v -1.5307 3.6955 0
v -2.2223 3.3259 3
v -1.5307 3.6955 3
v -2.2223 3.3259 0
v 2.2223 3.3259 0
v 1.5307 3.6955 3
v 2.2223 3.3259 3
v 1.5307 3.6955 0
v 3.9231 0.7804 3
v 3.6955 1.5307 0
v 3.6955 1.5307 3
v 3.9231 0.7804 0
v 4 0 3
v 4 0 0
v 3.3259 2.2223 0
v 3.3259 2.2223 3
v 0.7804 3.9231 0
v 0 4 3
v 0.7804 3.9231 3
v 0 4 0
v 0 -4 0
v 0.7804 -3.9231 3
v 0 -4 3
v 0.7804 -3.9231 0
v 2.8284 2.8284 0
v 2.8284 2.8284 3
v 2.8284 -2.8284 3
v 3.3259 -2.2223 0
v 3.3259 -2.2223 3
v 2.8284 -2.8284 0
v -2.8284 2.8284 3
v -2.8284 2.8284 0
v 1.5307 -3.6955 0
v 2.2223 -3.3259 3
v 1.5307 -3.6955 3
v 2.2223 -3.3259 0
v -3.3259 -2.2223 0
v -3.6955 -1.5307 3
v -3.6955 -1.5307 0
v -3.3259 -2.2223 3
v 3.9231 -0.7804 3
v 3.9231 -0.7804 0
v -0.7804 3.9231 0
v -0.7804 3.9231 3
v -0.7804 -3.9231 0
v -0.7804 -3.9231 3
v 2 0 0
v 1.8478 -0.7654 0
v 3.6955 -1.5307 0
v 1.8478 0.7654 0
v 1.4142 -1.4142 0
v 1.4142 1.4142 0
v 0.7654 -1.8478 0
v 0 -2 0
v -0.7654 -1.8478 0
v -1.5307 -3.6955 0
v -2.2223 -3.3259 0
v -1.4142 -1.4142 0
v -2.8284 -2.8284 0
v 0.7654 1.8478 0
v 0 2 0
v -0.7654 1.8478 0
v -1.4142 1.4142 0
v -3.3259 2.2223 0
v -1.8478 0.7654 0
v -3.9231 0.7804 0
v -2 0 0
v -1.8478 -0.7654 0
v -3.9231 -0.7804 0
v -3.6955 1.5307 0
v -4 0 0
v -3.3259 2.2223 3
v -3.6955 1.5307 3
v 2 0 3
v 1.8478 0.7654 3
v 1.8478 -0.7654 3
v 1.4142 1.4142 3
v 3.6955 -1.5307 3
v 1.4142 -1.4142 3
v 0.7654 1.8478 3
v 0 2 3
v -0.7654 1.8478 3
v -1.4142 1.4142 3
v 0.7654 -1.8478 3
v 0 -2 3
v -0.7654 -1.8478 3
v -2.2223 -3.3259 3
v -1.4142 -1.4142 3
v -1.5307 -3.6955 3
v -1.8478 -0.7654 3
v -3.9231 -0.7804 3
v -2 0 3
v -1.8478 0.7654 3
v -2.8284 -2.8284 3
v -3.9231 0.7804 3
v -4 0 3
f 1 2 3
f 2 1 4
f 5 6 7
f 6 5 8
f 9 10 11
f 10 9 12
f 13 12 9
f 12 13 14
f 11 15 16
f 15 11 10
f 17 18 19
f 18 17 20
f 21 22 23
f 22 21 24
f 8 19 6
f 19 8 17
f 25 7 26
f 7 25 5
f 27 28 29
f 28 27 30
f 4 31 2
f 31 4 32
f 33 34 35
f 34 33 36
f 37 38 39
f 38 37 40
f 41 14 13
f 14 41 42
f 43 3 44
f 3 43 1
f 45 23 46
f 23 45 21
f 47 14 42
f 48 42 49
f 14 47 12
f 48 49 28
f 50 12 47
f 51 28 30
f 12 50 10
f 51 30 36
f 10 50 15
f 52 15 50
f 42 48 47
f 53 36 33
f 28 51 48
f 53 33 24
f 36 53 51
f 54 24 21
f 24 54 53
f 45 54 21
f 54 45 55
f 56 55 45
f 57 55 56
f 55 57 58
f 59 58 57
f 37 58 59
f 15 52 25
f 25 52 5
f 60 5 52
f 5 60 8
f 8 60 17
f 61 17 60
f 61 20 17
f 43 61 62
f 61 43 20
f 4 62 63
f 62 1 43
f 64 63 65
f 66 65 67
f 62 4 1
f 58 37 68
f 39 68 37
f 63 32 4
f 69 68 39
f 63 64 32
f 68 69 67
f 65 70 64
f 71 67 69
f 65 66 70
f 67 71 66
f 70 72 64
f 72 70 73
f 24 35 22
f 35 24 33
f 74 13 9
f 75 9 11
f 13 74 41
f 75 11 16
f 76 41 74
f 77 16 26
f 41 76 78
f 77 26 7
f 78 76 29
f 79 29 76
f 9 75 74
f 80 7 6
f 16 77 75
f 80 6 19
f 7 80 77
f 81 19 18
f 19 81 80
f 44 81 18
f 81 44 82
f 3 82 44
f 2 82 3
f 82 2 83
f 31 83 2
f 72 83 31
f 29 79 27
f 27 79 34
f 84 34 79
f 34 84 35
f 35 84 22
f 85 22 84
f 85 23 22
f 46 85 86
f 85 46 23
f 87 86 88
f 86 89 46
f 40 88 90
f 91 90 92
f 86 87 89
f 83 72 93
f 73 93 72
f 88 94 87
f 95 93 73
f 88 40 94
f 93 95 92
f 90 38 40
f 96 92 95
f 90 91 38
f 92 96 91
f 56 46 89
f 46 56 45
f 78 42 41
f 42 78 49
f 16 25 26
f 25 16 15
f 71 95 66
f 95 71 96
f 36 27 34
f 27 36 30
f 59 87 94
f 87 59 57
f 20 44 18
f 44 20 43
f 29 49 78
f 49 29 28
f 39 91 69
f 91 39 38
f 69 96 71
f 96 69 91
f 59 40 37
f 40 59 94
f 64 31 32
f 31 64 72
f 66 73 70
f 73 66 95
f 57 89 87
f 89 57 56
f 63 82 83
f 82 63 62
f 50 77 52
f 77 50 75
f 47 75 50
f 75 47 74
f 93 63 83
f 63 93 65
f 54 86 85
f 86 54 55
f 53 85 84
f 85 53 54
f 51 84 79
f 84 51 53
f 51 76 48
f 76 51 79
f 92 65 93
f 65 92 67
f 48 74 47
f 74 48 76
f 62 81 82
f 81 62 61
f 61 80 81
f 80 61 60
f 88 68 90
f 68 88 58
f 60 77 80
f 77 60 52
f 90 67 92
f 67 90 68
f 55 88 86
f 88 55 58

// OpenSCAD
// file: ../Values/Backplate.scad
// -- Werte für die Backplate

// Dicke der Backplate
backplateThickness = 2;

// Wie viel Spielraum zwischen der BP und der Kette gelassen werden soll.
backplateTrackPlay = 2;

// Wie groß soll die Wand sein, welche die Mutter an der Frontplate umschließt
IdlerNutMountThickness = 1;

// Wie viel der BP soll unten "geschnitten" werden?
plateGroundClearance = 5;
// file: ../Values/Motor.scad
// -- Werte der Schrittmotoren --

// Achsen-Werte
motorAxisIndentLength 	= 15;		// Länge der mit "Schnitt" versehenen Achsenstrecke.
motorAxisFullLength		= 22;		// Länge der gesamten Achse, gemessen von der Hinterplatte aus.
motorAxisIndentDiam 		= 4.5; 	// Diameter der "geschnittenen" Achsenstrecke
motorAxisFullDiam			= 5;		// Diameter der gesamten Achse.


// Generelle Motor-Werte
motorSizeWidth 				= 35;	// Breite des Motors
motorMountscrewsDistance 	= 26;	// Entfernung der Befestigungschrauben zueinander
motorBackplateHoleDiameter = 22;	// Größe der runden Fläche vorn am Motor, für die ein Loch gemacht werden muss.
motorBackplateHoleHeight 	= 2; 	// Höhe eben jener runden Fläche
// file: ../Values/Track.scad
// Werte für Idler-Räder
smallWheelSize = 10;	// Radius des Idler-Rads
// Werte für das Motor-Rad
motorWheelSize = 15; // Größe des Motor-Antriebsrades

// Größen der Kette
	trackWidth = 20;
	trackThickness = 1.5;

// Werte für die Verzahnung der Kette
	trackTeethHeight = 1.5;		// Höhe der Verzahnung
	trackTeethBaseWidth = 1.5;	// Breite eines Zahnes
	trackTeethTopWidth = 0.6;

	trackTeethSpacing = (smallWheelSize * 6.2831) / 10;		// Mit welchem Abstand sollen die Zähne vorkommen?

	trackTeethNoslipBase = 3; 	// Wie weit in der Mitte der Kette die Verzahnung entfernt werden soll, um sie auf den Rädern zu halten.
	trackTeethNoslipTop = 5;


// Werte für die Kette selbst
	floorWheelNum = 4; 			// Anzahl der Räder welche auf dem Boden aufliegen.
	floorWheelStartX 	= -45;	// Anfang der Boden-Räder
	floorWheelEndX 		=	45; 	// Ende der Boden-Räder
	function floorWheels() = [ for(x = [floorWheelStartX:(floorWheelEndX - floorWheelStartX)/(floorWheelNum-1):floorWheelEndX]) [x, smallWheelSize]];

	// Array mit den einzelnen Positionen der Räder (erster Eintrag bestimmt den Motor)
	wheelPositions = concat([[0, 40], [-57, 35]], floorWheels());

	// Zusätzliche Punkte, mit welchen die Backplate an einigen Stellen vergrößert werden kann.
	backplateExtraSpots = [wheelPositions[0] + [17.5, 17.5], wheelPositions[0] + [-17.5, 17.5]];


echo(wheelPositions);
// file: ../Values/Mechanic.scad
// Größen für die M4-Schraube (Idler)
idlerScrewDiameter = 4;
idlerScrewHeadDiameter = 8;
idlerScrewHeadHeight = 3.25;
idlerScrewLength = 20;

// Größen für die Mutter
idlerNutHeight = 3.2;
idlerNutWidth = 7 / 0.866;

// Größen für die Kugellager
ballBearingInnerDiameter = 4;
ballBearingOuterDiameter = 8;
ballBearingHeight = 3;
// file: ../Values/Values.scad
$fs = 0.8;
$fa = 7;

// Mechanik-Werte
include <Mechanic.scad>

// Idler-Räder-Werte
include <Track.scad>

// Schrittmotor-Werte
include <Motor.scad>

// Backplate-Werte
include <Backplate.scad>
// main file
include <../Values/Values.scad>

module idler_screw(backplate_aligned = true) {
  translate([0, 0, (backplate_aligned) ? - backplateThickness : 0]) {
    cylinder(d = idlerScrewHeadDiameter, h = idlerScrewHeadHeight);
    translate([0, 0, idlerScrewHeadHeight - 0.0001 ]) cylinder(d = idlerScrewDiameter, h = idlerScrewLength);
  }
}

module idler_screw_nut() {
	difference() {
		cylinder(d = idlerNutWidth, h = idlerNutHeight);
		translate([0, 0, -0.1]) cylinder(d = idlerScrewDiameter, h = idlerNutHeight + 0.2);
	}
}

module ball_bearing() {
	difference() {
		cylinder(d = ballBearingOuterDiameter, h = ballBearingHeight);
		translate([0, 0, -0.1]) cylinder(d = ballBearingInnerDiameter, h = ballBearingHeight + 0.2);
	}
}

ball_bearing();
